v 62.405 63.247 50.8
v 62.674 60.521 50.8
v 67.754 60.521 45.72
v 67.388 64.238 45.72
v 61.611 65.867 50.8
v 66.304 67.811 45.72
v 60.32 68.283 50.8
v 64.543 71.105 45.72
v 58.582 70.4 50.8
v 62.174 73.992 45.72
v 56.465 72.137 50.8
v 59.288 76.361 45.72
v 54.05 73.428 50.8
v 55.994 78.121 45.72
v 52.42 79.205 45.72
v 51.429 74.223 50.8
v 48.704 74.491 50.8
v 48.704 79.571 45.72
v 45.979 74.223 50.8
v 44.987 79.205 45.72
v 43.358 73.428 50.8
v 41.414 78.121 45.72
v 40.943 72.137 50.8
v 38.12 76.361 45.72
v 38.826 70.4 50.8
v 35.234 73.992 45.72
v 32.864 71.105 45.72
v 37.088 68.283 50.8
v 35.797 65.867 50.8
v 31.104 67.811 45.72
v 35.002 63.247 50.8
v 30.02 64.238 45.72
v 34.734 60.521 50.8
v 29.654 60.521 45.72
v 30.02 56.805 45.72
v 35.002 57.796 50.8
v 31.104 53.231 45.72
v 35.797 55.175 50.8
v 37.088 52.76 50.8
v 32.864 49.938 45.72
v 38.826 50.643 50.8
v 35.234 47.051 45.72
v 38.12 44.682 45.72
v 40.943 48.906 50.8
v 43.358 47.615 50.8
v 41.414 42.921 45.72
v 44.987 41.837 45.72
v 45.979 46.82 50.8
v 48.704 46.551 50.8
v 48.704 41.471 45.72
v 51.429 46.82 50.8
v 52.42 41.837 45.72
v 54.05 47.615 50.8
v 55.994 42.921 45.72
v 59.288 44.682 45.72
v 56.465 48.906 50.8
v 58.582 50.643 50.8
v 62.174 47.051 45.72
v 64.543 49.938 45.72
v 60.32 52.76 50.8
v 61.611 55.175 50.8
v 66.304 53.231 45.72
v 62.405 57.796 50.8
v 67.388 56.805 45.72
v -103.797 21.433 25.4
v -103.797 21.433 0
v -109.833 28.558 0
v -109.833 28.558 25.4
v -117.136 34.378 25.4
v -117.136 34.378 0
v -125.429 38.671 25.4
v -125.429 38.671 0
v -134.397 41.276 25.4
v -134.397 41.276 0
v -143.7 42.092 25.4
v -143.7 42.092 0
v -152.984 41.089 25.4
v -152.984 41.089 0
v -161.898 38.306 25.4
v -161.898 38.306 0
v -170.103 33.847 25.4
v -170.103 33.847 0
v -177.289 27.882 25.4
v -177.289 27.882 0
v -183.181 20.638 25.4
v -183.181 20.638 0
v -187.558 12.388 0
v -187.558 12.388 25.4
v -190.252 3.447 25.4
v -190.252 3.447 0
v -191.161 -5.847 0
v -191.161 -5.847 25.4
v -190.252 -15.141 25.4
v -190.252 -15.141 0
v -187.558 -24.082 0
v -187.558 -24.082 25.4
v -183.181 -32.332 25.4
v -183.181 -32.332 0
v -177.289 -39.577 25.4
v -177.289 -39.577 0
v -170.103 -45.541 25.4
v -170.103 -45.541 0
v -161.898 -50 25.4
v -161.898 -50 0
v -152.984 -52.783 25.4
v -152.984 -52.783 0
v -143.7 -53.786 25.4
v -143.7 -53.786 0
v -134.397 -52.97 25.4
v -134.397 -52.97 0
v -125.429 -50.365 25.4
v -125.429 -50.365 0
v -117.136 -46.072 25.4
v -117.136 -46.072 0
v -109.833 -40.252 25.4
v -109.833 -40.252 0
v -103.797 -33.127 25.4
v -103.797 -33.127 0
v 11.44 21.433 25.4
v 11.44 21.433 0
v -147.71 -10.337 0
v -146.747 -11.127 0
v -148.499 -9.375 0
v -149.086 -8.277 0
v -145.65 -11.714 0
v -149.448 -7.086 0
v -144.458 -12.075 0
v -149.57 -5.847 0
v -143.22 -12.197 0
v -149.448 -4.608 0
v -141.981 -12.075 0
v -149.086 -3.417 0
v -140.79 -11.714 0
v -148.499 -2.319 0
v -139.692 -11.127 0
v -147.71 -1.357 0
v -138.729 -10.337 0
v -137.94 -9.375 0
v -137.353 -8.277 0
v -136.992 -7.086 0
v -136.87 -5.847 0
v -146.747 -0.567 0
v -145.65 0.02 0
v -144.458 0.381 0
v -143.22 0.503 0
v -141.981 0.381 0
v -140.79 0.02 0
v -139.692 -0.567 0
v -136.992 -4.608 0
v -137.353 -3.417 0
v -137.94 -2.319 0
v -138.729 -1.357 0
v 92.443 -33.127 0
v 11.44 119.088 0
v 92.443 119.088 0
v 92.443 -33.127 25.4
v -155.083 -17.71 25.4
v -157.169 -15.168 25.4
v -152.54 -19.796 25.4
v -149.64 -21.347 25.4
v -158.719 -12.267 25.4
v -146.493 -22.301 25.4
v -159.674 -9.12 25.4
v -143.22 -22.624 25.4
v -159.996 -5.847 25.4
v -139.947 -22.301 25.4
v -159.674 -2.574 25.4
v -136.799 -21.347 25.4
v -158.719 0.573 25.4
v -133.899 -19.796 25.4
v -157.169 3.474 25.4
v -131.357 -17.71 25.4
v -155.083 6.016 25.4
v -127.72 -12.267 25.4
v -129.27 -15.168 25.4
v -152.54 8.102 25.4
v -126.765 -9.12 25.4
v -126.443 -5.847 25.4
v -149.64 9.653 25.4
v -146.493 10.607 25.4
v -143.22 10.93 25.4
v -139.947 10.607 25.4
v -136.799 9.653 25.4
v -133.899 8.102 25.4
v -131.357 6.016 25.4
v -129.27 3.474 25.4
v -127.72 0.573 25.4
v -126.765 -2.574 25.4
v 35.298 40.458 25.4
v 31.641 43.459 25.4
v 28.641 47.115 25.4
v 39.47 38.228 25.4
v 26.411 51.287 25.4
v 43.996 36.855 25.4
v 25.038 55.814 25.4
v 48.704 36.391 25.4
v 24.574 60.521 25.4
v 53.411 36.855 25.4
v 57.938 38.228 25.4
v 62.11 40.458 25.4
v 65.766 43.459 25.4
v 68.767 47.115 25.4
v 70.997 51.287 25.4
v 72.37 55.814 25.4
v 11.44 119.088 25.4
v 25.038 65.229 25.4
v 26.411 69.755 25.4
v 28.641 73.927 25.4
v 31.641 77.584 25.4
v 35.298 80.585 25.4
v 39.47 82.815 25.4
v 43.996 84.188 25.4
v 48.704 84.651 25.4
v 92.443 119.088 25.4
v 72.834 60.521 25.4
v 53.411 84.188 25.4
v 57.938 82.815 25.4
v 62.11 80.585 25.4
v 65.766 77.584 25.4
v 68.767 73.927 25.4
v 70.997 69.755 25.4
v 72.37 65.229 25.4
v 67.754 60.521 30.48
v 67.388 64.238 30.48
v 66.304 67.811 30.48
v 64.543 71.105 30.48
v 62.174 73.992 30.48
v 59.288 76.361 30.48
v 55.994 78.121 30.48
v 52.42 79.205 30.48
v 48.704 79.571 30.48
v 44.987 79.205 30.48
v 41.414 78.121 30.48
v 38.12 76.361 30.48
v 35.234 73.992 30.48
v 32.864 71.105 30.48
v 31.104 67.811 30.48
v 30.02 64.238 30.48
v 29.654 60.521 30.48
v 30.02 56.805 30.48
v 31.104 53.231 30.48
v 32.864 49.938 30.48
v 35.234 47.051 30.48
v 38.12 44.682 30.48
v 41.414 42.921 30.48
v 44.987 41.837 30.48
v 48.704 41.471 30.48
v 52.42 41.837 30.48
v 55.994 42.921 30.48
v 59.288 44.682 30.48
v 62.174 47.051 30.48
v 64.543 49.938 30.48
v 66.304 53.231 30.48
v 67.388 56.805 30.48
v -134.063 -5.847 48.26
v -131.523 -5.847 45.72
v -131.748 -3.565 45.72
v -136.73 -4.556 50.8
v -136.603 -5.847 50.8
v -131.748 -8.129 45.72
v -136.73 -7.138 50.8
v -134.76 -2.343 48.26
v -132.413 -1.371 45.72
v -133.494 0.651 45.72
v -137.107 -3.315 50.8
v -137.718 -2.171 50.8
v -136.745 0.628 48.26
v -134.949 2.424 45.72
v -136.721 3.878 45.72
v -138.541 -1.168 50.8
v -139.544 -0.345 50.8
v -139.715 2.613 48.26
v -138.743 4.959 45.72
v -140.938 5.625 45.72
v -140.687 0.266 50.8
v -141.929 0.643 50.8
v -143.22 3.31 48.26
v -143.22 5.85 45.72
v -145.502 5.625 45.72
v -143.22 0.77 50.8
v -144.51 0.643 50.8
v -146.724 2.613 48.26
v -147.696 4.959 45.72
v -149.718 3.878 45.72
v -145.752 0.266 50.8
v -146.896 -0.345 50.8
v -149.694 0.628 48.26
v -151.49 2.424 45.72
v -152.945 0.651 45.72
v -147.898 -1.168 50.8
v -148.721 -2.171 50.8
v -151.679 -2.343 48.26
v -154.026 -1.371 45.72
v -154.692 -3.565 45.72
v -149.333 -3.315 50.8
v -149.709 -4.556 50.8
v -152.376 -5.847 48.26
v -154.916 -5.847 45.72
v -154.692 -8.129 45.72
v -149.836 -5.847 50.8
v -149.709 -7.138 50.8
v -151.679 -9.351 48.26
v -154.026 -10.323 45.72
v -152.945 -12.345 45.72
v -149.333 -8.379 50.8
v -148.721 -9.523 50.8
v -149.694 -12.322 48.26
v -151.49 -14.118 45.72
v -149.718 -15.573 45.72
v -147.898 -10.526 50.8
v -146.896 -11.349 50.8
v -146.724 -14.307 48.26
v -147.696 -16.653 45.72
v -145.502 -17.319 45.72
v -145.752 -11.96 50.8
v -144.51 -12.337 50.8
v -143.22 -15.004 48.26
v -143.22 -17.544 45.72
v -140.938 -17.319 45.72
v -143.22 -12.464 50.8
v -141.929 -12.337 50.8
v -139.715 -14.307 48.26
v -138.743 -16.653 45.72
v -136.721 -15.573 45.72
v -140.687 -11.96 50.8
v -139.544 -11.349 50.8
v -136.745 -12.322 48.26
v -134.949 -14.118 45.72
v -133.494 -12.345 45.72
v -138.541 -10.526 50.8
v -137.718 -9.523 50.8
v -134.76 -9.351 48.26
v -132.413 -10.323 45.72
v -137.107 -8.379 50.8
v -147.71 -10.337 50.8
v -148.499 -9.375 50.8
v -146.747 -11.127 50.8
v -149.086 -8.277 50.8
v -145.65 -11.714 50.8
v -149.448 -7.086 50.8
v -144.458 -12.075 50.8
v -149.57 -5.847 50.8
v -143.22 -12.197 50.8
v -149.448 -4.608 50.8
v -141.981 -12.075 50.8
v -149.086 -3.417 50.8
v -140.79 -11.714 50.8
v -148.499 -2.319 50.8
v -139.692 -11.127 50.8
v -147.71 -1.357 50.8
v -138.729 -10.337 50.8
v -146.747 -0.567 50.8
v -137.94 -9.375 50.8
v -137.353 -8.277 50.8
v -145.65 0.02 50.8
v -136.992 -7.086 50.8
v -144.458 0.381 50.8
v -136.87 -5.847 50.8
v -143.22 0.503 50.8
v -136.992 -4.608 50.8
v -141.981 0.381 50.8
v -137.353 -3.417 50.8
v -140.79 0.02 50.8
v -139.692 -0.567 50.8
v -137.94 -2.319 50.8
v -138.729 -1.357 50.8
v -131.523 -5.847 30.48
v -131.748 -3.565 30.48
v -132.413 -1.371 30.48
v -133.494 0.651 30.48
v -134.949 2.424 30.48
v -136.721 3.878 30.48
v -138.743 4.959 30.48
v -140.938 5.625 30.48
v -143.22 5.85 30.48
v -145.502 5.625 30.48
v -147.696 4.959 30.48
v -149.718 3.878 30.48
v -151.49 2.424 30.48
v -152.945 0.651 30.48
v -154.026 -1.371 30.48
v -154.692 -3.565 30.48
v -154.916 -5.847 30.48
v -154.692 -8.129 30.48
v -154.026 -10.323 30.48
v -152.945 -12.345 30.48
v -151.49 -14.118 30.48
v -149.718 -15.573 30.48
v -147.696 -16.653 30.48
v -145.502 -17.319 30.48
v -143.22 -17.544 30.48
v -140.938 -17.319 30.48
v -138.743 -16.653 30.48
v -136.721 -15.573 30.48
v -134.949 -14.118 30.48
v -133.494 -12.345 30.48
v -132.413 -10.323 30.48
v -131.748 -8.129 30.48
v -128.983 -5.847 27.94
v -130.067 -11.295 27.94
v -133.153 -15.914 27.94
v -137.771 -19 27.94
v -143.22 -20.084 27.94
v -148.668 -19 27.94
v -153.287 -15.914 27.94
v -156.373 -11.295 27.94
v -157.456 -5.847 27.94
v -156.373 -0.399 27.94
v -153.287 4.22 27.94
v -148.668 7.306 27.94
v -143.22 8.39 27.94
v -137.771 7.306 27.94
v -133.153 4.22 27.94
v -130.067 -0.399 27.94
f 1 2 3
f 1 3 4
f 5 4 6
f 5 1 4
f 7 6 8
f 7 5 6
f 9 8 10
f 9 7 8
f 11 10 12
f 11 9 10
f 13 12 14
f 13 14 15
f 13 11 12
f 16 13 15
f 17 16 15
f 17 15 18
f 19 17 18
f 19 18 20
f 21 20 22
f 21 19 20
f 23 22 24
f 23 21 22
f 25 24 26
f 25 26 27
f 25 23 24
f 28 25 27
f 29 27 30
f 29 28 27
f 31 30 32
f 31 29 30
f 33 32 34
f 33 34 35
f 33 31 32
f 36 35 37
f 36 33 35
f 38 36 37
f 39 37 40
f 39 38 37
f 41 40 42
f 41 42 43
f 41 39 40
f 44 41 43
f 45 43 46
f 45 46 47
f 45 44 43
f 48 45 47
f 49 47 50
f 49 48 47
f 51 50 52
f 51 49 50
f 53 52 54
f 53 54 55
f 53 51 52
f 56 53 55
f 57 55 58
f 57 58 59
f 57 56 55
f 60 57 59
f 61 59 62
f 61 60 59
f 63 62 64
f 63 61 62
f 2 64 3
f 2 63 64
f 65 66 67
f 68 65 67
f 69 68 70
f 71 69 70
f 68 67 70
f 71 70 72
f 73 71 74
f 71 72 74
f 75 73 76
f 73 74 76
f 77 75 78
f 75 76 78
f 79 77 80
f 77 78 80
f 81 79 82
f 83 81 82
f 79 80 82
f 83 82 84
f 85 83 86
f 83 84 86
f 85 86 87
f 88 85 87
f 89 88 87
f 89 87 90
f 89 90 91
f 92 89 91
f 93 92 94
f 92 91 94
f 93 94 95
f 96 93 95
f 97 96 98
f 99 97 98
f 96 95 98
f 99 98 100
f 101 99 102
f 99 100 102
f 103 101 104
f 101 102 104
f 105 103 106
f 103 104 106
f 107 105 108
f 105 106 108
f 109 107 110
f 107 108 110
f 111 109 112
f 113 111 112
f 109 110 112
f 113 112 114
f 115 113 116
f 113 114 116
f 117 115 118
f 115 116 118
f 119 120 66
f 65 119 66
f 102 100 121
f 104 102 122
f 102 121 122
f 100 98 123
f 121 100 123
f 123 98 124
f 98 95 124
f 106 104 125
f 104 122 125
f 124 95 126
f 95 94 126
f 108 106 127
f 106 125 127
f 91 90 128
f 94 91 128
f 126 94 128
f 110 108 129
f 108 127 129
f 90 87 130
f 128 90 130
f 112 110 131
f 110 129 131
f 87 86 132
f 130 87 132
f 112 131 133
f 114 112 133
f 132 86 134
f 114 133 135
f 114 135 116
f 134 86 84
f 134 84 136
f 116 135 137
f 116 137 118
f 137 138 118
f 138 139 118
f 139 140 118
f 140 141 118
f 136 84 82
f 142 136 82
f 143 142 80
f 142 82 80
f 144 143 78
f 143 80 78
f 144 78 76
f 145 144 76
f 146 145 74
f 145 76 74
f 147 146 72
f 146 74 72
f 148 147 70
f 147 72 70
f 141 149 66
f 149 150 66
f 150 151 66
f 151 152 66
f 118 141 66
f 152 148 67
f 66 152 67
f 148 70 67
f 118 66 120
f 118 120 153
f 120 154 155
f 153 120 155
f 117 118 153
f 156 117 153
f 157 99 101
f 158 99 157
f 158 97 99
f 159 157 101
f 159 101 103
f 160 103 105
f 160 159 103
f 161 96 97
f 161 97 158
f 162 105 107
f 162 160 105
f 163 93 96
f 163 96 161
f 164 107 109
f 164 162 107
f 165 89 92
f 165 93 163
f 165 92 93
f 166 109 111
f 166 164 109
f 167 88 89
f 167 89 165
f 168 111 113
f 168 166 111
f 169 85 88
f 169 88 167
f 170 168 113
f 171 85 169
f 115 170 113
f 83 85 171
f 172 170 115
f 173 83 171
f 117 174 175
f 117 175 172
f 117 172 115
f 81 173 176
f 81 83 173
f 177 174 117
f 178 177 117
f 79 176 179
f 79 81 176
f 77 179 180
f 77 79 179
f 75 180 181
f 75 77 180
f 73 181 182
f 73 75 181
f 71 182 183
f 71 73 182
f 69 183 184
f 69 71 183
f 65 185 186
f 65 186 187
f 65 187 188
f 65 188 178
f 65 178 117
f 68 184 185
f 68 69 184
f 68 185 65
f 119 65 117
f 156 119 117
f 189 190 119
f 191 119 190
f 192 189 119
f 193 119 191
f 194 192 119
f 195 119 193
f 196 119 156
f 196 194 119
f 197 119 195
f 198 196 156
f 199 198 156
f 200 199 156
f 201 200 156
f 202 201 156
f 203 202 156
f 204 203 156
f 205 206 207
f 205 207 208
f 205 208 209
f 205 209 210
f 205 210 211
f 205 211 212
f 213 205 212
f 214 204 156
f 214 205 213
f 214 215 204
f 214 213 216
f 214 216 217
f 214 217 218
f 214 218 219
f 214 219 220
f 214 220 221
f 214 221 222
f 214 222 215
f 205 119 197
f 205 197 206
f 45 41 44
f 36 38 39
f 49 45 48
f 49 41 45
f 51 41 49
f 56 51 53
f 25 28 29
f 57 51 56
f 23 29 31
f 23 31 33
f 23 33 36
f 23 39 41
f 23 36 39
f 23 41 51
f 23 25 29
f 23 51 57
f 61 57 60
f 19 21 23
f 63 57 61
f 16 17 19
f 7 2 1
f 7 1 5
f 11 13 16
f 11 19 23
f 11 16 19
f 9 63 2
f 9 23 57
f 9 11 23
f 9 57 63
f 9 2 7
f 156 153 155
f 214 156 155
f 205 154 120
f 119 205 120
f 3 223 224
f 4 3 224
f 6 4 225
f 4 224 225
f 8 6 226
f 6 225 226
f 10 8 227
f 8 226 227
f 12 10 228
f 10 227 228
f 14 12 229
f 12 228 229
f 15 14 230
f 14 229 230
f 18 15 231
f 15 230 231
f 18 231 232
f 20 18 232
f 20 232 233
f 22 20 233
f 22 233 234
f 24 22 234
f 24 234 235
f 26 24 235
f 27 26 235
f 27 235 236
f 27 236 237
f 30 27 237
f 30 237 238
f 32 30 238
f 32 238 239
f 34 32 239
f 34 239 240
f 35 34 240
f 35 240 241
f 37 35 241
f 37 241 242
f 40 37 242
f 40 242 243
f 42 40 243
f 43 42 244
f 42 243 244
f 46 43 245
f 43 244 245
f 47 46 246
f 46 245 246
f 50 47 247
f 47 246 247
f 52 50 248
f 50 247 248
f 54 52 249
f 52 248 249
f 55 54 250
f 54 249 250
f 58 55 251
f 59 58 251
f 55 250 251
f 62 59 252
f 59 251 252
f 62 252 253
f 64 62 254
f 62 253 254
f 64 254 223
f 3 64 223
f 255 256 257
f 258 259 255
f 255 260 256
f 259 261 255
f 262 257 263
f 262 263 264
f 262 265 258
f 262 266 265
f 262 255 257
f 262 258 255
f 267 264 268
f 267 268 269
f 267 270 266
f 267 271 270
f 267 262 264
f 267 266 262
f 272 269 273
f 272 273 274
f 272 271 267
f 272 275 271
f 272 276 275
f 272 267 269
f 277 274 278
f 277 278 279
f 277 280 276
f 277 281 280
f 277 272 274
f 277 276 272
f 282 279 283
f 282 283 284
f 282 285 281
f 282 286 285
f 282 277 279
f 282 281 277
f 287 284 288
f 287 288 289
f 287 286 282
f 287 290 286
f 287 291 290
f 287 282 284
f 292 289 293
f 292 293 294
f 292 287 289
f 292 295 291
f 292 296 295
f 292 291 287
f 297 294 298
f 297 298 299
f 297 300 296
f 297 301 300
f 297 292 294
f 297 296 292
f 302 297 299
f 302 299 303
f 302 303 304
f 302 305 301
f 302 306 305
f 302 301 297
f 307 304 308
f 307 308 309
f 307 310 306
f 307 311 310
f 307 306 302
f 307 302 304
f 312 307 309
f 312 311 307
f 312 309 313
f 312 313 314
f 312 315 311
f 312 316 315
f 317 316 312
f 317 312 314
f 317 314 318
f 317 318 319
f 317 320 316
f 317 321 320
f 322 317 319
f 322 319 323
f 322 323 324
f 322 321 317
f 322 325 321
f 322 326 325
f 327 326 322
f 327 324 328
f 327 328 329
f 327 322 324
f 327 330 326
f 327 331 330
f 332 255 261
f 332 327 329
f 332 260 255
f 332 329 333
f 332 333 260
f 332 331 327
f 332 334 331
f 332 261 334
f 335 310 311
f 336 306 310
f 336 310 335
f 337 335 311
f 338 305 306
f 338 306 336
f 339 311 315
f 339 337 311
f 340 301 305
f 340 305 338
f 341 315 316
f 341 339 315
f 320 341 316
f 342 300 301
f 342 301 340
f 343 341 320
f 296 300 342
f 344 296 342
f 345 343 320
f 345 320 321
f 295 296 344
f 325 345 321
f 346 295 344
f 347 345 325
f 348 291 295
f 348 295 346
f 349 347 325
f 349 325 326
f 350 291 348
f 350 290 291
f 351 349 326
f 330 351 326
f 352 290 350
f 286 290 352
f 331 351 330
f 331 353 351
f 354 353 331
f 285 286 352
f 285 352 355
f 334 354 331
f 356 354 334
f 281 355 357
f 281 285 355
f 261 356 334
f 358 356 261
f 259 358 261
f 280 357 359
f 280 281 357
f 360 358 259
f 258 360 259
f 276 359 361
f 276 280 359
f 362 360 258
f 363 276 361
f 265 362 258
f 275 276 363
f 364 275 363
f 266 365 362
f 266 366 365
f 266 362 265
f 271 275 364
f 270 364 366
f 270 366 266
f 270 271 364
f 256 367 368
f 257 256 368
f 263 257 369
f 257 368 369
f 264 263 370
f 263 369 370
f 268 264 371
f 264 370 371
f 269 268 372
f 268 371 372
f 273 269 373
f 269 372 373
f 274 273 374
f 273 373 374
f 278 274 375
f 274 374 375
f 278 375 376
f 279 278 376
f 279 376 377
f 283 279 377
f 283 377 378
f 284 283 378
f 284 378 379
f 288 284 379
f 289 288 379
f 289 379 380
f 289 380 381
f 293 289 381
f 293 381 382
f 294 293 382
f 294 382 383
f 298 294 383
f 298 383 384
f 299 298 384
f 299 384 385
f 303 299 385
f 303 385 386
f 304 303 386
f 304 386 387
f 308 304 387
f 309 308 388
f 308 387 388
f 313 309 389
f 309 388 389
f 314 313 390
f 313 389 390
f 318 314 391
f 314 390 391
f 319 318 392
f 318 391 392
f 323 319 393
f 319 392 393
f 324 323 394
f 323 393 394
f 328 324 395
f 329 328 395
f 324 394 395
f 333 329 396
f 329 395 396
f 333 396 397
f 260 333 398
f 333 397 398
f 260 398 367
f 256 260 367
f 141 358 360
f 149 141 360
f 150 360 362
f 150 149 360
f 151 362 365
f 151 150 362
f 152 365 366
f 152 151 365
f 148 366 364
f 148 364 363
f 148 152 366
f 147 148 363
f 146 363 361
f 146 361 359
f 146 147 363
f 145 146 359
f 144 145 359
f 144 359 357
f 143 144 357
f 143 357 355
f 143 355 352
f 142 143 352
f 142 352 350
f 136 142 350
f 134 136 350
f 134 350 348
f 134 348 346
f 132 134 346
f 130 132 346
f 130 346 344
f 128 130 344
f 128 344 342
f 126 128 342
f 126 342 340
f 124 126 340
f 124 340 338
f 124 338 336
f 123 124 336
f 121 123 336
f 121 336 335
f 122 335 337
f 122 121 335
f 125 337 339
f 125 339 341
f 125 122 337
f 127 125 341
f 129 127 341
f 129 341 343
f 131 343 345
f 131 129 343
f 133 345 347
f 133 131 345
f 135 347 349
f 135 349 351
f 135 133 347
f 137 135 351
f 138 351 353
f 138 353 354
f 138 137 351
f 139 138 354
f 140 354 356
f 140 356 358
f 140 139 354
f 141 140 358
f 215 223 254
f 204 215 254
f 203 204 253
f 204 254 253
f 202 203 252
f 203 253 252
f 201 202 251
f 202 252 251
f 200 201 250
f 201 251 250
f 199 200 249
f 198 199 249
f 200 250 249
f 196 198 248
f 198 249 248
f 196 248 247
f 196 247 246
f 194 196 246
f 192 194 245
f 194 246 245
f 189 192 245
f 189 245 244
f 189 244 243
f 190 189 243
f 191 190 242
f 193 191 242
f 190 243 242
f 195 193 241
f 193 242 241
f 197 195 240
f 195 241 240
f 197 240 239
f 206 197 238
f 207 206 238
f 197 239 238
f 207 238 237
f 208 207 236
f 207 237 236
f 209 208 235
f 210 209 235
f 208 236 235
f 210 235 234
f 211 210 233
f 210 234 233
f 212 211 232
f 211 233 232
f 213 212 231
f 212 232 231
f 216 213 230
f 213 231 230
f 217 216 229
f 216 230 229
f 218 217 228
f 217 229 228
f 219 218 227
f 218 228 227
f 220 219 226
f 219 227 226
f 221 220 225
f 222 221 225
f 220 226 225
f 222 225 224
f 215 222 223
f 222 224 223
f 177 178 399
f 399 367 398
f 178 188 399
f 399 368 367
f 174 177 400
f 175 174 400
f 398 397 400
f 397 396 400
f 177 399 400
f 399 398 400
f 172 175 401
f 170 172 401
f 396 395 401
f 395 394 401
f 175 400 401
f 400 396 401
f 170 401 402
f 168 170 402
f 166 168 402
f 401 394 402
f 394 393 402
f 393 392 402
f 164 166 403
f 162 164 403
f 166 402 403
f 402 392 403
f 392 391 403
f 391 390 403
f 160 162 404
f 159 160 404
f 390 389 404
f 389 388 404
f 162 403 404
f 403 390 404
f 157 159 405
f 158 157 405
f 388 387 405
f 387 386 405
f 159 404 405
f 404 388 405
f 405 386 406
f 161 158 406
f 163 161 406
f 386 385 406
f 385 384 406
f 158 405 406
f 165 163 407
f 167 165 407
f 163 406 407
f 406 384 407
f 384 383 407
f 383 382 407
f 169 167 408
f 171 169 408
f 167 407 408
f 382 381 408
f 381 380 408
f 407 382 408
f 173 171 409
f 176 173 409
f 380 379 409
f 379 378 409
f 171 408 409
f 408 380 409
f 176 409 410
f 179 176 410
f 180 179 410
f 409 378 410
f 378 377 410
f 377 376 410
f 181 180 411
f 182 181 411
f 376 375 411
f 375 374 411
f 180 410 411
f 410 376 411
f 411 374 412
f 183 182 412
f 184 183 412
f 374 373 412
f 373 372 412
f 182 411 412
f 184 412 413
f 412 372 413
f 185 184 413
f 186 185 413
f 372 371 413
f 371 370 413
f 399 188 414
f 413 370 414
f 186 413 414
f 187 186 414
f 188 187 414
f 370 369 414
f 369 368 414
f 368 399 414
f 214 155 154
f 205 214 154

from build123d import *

# Parameters (mm, degrees)
F0_R     = 11.6967557634
F0_R_2   = 19.05
F0_R_3   = 6.35
F1_DEPTH = 25.4
F2_DEPTH = 50.8
F3_SIZE  = 5.08


with BuildPart() as f1:
    # F0 (on Top) → F1 (new body)
    with BuildSketch(Plane.XY):
        with BuildLine():
            Line((92.4426392051, -33.1271603522), (92.4426392051, 119.0881550823))
            Line((92.4426392051, 119.0881550823), (11.4402162096, 119.0881550823))
            Line((11.4402162096, 119.0881550823), (11.4402162096, 21.4330990914))
            Line((11.4402162096, 21.4330990914), (-103.7965849838, 21.4330990914))
            ThreePointArc((-103.7965849838, 21.4330990914), (-191.1610406822, -5.8470306304), (-103.7965849838, -33.1271603522))
            Line((-103.7965849838, -33.1271603522), (92.4426392051, -33.1271603522))
        make_face()
        with Locations((-143.2196122709, -5.8470306304)):
            Circle(F0_R, mode=Mode.SUBTRACT)
        with Locations((48.7039178401, 60.5212869929)):
            Circle(F0_R_2, mode=Mode.SUBTRACT)
        with Locations((48.7039178401, 60.5212869929)):
            Circle(F0_R_2)
        with Locations((-143.2196122709, -5.8470306304)):
            Circle(F0_R)
        with Locations((-143.2196122709, -5.8470306304)):
            Circle(F0_R_3, mode=Mode.SUBTRACT)
    extrude(amount=F1_DEPTH)

    # F0 (on Top) → F2 (join)
    with BuildSketch(Plane.XY):
        with Locations((-143.2196122709, -5.8470306304)):
            Circle(F0_R)
        with Locations((-143.2196122709, -5.8470306304)):
            Circle(F0_R_3, mode=Mode.SUBTRACT)
        with Locations((48.7039178401, 60.5212869929)):
            Circle(F0_R_2)
    extrude(amount=F2_DEPTH)

    # F3
    f3_edges = [f1.edges().sort_by_distance(p)[0] for p in [
        (29.653918, 60.521287, 50.8),
        (-154.916368, -5.847031, 25.4),
        (-154.916368, -5.847031, 50.8),
        (29.653918, 60.521287, 25.4),
    ]]
    chamfer(f3_edges, length=F3_SIZE)


solid = f1.part
